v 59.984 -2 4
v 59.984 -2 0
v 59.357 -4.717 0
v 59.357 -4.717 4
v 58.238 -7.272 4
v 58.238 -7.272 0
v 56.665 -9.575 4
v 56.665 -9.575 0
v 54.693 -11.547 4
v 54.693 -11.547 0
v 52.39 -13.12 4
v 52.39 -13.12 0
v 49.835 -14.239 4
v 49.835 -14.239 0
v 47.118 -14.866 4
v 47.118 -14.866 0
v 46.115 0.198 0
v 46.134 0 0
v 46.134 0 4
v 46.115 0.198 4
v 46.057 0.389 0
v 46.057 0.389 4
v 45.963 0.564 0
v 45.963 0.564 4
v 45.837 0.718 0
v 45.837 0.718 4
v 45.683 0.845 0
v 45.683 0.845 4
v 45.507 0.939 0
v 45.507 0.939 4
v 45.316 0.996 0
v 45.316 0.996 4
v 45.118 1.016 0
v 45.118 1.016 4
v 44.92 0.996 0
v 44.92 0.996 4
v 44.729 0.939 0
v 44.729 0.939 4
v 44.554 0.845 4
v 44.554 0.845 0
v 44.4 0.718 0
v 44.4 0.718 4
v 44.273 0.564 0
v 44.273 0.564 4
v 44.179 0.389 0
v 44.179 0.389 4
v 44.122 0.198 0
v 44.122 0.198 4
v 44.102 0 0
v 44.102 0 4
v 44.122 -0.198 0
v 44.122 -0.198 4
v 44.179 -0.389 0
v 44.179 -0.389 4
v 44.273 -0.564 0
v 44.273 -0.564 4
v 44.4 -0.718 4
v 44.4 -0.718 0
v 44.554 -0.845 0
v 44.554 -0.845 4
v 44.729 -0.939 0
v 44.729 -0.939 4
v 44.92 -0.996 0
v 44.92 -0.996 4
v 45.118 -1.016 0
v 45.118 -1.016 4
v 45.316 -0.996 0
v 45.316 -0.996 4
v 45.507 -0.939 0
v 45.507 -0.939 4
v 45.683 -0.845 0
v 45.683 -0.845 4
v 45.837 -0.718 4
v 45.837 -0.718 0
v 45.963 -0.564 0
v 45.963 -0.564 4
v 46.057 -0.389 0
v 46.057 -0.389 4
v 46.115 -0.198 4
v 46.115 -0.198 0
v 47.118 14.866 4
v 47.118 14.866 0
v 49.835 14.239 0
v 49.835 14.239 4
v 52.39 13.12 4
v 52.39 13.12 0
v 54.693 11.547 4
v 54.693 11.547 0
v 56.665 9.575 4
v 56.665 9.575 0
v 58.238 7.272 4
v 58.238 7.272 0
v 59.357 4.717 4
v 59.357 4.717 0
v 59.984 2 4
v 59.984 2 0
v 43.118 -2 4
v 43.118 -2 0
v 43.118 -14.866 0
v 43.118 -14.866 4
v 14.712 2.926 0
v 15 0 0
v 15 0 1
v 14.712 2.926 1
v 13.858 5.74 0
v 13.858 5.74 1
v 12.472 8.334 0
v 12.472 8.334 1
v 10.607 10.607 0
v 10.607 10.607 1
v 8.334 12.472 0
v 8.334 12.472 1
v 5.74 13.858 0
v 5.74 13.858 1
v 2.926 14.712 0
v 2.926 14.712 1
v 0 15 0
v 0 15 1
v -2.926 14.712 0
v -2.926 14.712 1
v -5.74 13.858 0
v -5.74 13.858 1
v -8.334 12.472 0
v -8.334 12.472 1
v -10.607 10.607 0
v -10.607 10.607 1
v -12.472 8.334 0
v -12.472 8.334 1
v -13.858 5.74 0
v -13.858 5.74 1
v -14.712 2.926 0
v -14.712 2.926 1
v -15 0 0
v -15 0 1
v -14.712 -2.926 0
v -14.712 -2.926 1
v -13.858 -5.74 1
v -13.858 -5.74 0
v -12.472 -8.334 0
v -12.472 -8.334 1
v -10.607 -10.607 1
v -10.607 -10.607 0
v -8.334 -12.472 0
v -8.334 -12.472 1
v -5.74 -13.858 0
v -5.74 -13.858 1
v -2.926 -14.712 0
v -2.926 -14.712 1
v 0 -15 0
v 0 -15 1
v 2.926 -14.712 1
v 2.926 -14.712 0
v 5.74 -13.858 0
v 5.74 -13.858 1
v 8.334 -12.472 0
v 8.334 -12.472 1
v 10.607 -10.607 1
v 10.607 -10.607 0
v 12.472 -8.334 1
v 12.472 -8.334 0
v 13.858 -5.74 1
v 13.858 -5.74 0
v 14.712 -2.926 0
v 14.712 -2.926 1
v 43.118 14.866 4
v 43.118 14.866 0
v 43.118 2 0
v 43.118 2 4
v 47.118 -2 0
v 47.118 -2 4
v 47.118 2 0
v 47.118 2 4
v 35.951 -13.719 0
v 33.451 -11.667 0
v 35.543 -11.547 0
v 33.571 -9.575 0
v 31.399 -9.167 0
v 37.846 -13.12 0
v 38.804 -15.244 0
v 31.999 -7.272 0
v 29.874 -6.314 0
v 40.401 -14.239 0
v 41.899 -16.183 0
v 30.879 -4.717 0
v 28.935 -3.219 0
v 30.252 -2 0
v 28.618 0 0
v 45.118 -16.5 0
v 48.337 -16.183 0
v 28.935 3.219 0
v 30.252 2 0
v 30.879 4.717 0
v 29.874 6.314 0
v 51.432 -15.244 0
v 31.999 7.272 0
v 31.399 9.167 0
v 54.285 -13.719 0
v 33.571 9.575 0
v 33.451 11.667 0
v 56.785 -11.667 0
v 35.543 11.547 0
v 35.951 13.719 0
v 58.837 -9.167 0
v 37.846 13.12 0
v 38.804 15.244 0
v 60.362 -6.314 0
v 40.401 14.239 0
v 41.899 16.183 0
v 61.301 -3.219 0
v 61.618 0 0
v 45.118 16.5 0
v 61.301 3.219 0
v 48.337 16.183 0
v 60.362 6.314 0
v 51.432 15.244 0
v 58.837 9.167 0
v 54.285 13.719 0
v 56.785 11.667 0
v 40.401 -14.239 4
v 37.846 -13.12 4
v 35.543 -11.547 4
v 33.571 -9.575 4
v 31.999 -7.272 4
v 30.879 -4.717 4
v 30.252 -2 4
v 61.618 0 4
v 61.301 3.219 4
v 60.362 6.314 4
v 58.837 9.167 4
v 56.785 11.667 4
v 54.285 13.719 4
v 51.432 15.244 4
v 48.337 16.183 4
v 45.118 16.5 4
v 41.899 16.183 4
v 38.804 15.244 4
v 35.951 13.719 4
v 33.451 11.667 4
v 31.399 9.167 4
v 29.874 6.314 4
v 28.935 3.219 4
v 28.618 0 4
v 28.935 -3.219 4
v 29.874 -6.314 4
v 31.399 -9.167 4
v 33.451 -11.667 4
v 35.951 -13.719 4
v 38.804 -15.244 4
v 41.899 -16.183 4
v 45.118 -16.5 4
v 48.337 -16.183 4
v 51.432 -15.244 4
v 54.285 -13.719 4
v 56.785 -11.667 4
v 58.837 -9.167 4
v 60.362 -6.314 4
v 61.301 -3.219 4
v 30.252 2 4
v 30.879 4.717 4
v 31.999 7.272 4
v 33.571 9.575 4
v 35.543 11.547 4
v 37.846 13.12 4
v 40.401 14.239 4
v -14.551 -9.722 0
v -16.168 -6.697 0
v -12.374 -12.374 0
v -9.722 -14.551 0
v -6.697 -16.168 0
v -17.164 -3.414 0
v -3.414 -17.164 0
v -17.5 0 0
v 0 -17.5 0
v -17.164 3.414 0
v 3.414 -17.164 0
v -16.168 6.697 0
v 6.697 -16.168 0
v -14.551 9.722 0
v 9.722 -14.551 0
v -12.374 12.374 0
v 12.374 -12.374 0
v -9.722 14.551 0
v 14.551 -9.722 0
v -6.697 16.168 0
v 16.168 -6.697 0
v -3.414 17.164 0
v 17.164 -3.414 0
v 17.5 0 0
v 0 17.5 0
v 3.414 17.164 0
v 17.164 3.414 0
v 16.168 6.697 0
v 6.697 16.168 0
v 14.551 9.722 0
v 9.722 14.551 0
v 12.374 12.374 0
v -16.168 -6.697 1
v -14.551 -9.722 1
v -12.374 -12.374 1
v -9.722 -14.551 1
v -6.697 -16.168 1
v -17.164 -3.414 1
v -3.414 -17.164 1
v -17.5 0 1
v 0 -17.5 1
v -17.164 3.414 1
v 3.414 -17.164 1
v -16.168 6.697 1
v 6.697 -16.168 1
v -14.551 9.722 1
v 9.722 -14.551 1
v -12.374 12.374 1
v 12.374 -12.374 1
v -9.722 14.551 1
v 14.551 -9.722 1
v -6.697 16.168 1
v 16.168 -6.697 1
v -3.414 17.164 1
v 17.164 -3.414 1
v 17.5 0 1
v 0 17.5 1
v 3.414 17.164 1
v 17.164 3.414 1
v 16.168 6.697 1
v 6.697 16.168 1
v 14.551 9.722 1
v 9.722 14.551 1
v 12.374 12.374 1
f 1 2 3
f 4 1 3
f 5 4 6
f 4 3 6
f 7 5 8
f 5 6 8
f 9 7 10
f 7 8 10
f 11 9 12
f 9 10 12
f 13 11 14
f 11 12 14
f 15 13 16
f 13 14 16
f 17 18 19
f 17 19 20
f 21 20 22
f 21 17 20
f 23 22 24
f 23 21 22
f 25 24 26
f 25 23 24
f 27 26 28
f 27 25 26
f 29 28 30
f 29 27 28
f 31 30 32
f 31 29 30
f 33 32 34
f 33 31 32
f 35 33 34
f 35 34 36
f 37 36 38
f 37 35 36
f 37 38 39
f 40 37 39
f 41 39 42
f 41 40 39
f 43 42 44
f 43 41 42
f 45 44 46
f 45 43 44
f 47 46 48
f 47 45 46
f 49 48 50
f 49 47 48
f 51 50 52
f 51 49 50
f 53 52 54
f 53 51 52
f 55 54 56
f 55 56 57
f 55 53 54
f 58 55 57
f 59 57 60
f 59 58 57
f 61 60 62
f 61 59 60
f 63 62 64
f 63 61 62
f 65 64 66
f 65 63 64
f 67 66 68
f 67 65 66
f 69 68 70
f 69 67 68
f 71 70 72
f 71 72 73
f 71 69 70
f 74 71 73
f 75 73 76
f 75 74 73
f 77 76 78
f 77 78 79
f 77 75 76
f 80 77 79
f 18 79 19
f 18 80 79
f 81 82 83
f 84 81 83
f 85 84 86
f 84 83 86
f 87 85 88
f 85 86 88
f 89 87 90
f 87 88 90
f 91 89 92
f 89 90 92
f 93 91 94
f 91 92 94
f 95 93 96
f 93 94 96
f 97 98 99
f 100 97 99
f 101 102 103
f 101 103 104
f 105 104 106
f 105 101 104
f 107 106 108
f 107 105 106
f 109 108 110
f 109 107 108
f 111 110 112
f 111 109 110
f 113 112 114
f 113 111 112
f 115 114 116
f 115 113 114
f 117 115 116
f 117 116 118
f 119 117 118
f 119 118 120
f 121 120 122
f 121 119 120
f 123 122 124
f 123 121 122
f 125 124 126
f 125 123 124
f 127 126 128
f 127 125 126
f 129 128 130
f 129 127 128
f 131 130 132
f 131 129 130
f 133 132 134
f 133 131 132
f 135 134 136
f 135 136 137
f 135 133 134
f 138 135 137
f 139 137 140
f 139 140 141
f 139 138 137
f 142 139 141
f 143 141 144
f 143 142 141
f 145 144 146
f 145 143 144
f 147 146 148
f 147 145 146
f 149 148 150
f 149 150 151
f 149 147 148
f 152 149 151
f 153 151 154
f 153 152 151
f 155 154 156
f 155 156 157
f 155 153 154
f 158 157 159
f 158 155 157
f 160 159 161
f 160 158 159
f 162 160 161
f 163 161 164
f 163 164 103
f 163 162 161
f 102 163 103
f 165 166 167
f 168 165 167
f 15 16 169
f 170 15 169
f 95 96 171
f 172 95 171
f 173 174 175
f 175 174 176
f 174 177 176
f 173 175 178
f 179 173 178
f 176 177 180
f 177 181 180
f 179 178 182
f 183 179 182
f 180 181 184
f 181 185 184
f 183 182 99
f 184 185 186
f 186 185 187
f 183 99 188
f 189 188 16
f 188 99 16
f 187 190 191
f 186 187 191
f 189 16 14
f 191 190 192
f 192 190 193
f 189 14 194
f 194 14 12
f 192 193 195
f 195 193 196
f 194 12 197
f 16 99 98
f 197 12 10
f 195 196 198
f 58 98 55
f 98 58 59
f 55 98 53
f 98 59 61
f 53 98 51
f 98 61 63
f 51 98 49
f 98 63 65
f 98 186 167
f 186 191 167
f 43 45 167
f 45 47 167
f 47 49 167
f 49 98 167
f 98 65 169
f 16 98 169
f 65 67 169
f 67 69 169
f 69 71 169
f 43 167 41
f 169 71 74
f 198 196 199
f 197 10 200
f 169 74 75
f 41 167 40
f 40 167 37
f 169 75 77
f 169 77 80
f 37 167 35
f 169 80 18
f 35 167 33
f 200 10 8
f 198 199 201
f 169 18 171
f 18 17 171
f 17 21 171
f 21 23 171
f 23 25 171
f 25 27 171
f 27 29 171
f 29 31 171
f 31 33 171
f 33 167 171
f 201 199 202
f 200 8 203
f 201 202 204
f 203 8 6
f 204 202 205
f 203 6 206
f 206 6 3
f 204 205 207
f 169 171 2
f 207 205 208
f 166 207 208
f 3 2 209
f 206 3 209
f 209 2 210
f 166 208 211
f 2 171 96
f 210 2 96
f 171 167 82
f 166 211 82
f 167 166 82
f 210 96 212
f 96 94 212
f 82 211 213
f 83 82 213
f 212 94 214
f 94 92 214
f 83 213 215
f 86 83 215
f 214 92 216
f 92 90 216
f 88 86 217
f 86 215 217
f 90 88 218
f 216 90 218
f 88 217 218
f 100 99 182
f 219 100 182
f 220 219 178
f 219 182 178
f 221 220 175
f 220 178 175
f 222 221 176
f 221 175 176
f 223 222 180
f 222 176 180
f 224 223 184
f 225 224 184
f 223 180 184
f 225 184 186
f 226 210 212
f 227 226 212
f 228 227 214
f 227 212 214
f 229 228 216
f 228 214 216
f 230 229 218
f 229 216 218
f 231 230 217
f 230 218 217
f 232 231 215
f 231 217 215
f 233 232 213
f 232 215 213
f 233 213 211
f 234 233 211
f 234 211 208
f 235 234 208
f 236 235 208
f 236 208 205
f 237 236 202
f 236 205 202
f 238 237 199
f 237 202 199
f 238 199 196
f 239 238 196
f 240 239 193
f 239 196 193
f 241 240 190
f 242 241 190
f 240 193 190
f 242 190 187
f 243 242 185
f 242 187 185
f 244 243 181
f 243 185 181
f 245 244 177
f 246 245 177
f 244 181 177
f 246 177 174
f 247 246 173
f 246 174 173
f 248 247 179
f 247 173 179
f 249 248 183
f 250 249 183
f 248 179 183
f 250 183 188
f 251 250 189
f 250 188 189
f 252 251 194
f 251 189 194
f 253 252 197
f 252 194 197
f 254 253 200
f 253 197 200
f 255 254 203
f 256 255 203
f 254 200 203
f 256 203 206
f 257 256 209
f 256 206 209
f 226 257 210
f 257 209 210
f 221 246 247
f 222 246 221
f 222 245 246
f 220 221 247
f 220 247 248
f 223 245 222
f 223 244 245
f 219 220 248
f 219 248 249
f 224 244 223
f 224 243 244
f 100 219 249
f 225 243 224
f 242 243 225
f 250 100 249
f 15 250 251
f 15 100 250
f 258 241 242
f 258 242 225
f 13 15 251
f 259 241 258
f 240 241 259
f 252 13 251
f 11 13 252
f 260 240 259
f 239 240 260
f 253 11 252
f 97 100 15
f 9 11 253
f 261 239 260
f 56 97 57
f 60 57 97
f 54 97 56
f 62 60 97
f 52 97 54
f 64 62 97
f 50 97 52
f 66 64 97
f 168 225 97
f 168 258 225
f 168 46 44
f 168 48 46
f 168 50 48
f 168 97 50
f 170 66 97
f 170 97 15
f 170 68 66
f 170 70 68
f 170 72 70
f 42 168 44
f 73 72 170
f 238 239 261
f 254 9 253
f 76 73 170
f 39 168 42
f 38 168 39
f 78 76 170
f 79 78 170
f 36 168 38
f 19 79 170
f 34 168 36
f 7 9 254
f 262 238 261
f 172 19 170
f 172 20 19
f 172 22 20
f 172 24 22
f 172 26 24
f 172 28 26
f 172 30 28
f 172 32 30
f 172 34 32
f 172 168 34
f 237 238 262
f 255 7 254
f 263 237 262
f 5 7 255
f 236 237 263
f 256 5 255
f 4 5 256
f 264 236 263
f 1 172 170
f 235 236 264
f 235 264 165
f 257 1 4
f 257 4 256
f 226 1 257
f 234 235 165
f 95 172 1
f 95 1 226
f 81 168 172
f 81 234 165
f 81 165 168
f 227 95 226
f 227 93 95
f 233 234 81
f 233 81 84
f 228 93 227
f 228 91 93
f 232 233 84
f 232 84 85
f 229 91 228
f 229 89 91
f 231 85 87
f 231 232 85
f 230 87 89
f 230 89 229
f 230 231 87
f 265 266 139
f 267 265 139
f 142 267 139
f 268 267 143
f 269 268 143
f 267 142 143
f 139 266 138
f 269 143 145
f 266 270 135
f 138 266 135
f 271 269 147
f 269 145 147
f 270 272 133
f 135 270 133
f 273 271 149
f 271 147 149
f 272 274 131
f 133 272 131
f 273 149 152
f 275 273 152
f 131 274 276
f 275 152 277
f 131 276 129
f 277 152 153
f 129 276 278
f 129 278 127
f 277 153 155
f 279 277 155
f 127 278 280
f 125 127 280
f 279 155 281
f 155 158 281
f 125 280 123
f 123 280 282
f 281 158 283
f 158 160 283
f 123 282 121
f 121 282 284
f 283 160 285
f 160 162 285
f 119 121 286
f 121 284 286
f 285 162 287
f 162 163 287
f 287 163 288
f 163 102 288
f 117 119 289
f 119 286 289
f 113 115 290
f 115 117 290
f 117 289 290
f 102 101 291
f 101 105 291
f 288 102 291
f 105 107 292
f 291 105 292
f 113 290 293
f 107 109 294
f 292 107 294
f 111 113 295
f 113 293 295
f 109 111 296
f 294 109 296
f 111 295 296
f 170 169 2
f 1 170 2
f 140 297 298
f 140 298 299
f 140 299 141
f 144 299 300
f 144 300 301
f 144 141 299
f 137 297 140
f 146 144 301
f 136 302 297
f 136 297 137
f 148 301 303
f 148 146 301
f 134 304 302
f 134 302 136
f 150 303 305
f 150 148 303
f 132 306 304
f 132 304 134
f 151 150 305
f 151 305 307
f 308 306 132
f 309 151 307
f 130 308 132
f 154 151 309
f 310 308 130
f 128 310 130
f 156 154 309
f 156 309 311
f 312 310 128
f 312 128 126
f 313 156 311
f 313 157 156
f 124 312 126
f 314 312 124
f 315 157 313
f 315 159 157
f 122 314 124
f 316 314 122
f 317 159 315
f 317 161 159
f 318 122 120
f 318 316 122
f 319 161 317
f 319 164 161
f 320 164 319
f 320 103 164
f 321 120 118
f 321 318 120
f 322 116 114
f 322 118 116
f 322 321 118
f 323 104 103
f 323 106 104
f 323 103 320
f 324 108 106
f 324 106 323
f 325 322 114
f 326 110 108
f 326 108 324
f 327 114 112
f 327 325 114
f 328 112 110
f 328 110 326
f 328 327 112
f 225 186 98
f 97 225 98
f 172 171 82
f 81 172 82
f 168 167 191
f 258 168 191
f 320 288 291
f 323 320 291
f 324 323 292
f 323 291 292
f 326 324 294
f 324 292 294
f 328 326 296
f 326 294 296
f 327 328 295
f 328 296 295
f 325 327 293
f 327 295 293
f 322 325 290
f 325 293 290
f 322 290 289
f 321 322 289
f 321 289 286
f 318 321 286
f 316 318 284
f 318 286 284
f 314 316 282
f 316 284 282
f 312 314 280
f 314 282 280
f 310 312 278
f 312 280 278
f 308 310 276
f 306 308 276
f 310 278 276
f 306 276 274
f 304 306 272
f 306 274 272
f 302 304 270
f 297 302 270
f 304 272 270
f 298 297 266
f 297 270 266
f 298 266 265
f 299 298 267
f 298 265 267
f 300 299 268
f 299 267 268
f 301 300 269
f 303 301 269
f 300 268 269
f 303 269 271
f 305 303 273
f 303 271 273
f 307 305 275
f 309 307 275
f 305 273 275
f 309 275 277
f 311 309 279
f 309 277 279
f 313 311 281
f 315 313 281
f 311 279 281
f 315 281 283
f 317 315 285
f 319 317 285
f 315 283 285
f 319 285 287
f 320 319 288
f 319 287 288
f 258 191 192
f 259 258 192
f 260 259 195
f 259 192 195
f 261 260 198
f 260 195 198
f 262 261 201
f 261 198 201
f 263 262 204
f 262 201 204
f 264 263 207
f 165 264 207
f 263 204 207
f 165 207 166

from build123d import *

# Parameters (mm, degrees)
F0_R     = 17.5
F0_R_2   = 15
F1_DEPTH = 1
F0_R_3   = 16.5
F0_R_4   = 1.016
F2_DEPTH = 4


with BuildPart() as f1:
    # F0 (on Top) → F1 (new body)
    with BuildSketch(Plane.XY):
        Circle(F0_R)
        Circle(F0_R_2, mode=Mode.SUBTRACT)
    extrude(amount=F1_DEPTH)


with BuildPart() as f2:
    # F0 (on Top) → F2 (new body)
    with BuildSketch(Plane.XY):
        with Locations((45.118097, 0)):
            Circle(F0_R_3)
        with BuildLine():
            ThreePointArc((43.118097, -14.866069), (34.511495, -10.606602), (30.252028, -2))
            Line((30.252028, -2), (43.118097, -2))
            Line((43.118097, -2), (43.118097, -14.866069))
        make_face(mode=Mode.SUBTRACT)
        with BuildLine():
            ThreePointArc((59.984166, -2), (55.724699, -10.606602), (47.118097, -14.866069))
            Line((47.118097, -14.866069), (47.118097, -2))
            Line((47.118097, -2), (59.984166, -2))
        make_face(mode=Mode.SUBTRACT)
        with BuildLine():
            ThreePointArc((30.252028, 2), (34.511495, 10.606602), (43.118097, 14.866069))
            Line((43.118097, 14.866069), (43.118097, 2))
            Line((43.118097, 2), (30.252028, 2))
        make_face(mode=Mode.SUBTRACT)
        with Locations((45.118097, 0)):
            Circle(F0_R_4, mode=Mode.SUBTRACT)
        with BuildLine():
            Line((47.118097, 2), (47.118097, 14.866069))
            ThreePointArc((47.118097, 14.866069), (55.724699, 10.606602), (59.984166, 2))
            Line((59.984166, 2), (47.118097, 2))
        make_face(mode=Mode.SUBTRACT)
    extrude(amount=F2_DEPTH)


solid = Compound([f1.part, f2.part])
